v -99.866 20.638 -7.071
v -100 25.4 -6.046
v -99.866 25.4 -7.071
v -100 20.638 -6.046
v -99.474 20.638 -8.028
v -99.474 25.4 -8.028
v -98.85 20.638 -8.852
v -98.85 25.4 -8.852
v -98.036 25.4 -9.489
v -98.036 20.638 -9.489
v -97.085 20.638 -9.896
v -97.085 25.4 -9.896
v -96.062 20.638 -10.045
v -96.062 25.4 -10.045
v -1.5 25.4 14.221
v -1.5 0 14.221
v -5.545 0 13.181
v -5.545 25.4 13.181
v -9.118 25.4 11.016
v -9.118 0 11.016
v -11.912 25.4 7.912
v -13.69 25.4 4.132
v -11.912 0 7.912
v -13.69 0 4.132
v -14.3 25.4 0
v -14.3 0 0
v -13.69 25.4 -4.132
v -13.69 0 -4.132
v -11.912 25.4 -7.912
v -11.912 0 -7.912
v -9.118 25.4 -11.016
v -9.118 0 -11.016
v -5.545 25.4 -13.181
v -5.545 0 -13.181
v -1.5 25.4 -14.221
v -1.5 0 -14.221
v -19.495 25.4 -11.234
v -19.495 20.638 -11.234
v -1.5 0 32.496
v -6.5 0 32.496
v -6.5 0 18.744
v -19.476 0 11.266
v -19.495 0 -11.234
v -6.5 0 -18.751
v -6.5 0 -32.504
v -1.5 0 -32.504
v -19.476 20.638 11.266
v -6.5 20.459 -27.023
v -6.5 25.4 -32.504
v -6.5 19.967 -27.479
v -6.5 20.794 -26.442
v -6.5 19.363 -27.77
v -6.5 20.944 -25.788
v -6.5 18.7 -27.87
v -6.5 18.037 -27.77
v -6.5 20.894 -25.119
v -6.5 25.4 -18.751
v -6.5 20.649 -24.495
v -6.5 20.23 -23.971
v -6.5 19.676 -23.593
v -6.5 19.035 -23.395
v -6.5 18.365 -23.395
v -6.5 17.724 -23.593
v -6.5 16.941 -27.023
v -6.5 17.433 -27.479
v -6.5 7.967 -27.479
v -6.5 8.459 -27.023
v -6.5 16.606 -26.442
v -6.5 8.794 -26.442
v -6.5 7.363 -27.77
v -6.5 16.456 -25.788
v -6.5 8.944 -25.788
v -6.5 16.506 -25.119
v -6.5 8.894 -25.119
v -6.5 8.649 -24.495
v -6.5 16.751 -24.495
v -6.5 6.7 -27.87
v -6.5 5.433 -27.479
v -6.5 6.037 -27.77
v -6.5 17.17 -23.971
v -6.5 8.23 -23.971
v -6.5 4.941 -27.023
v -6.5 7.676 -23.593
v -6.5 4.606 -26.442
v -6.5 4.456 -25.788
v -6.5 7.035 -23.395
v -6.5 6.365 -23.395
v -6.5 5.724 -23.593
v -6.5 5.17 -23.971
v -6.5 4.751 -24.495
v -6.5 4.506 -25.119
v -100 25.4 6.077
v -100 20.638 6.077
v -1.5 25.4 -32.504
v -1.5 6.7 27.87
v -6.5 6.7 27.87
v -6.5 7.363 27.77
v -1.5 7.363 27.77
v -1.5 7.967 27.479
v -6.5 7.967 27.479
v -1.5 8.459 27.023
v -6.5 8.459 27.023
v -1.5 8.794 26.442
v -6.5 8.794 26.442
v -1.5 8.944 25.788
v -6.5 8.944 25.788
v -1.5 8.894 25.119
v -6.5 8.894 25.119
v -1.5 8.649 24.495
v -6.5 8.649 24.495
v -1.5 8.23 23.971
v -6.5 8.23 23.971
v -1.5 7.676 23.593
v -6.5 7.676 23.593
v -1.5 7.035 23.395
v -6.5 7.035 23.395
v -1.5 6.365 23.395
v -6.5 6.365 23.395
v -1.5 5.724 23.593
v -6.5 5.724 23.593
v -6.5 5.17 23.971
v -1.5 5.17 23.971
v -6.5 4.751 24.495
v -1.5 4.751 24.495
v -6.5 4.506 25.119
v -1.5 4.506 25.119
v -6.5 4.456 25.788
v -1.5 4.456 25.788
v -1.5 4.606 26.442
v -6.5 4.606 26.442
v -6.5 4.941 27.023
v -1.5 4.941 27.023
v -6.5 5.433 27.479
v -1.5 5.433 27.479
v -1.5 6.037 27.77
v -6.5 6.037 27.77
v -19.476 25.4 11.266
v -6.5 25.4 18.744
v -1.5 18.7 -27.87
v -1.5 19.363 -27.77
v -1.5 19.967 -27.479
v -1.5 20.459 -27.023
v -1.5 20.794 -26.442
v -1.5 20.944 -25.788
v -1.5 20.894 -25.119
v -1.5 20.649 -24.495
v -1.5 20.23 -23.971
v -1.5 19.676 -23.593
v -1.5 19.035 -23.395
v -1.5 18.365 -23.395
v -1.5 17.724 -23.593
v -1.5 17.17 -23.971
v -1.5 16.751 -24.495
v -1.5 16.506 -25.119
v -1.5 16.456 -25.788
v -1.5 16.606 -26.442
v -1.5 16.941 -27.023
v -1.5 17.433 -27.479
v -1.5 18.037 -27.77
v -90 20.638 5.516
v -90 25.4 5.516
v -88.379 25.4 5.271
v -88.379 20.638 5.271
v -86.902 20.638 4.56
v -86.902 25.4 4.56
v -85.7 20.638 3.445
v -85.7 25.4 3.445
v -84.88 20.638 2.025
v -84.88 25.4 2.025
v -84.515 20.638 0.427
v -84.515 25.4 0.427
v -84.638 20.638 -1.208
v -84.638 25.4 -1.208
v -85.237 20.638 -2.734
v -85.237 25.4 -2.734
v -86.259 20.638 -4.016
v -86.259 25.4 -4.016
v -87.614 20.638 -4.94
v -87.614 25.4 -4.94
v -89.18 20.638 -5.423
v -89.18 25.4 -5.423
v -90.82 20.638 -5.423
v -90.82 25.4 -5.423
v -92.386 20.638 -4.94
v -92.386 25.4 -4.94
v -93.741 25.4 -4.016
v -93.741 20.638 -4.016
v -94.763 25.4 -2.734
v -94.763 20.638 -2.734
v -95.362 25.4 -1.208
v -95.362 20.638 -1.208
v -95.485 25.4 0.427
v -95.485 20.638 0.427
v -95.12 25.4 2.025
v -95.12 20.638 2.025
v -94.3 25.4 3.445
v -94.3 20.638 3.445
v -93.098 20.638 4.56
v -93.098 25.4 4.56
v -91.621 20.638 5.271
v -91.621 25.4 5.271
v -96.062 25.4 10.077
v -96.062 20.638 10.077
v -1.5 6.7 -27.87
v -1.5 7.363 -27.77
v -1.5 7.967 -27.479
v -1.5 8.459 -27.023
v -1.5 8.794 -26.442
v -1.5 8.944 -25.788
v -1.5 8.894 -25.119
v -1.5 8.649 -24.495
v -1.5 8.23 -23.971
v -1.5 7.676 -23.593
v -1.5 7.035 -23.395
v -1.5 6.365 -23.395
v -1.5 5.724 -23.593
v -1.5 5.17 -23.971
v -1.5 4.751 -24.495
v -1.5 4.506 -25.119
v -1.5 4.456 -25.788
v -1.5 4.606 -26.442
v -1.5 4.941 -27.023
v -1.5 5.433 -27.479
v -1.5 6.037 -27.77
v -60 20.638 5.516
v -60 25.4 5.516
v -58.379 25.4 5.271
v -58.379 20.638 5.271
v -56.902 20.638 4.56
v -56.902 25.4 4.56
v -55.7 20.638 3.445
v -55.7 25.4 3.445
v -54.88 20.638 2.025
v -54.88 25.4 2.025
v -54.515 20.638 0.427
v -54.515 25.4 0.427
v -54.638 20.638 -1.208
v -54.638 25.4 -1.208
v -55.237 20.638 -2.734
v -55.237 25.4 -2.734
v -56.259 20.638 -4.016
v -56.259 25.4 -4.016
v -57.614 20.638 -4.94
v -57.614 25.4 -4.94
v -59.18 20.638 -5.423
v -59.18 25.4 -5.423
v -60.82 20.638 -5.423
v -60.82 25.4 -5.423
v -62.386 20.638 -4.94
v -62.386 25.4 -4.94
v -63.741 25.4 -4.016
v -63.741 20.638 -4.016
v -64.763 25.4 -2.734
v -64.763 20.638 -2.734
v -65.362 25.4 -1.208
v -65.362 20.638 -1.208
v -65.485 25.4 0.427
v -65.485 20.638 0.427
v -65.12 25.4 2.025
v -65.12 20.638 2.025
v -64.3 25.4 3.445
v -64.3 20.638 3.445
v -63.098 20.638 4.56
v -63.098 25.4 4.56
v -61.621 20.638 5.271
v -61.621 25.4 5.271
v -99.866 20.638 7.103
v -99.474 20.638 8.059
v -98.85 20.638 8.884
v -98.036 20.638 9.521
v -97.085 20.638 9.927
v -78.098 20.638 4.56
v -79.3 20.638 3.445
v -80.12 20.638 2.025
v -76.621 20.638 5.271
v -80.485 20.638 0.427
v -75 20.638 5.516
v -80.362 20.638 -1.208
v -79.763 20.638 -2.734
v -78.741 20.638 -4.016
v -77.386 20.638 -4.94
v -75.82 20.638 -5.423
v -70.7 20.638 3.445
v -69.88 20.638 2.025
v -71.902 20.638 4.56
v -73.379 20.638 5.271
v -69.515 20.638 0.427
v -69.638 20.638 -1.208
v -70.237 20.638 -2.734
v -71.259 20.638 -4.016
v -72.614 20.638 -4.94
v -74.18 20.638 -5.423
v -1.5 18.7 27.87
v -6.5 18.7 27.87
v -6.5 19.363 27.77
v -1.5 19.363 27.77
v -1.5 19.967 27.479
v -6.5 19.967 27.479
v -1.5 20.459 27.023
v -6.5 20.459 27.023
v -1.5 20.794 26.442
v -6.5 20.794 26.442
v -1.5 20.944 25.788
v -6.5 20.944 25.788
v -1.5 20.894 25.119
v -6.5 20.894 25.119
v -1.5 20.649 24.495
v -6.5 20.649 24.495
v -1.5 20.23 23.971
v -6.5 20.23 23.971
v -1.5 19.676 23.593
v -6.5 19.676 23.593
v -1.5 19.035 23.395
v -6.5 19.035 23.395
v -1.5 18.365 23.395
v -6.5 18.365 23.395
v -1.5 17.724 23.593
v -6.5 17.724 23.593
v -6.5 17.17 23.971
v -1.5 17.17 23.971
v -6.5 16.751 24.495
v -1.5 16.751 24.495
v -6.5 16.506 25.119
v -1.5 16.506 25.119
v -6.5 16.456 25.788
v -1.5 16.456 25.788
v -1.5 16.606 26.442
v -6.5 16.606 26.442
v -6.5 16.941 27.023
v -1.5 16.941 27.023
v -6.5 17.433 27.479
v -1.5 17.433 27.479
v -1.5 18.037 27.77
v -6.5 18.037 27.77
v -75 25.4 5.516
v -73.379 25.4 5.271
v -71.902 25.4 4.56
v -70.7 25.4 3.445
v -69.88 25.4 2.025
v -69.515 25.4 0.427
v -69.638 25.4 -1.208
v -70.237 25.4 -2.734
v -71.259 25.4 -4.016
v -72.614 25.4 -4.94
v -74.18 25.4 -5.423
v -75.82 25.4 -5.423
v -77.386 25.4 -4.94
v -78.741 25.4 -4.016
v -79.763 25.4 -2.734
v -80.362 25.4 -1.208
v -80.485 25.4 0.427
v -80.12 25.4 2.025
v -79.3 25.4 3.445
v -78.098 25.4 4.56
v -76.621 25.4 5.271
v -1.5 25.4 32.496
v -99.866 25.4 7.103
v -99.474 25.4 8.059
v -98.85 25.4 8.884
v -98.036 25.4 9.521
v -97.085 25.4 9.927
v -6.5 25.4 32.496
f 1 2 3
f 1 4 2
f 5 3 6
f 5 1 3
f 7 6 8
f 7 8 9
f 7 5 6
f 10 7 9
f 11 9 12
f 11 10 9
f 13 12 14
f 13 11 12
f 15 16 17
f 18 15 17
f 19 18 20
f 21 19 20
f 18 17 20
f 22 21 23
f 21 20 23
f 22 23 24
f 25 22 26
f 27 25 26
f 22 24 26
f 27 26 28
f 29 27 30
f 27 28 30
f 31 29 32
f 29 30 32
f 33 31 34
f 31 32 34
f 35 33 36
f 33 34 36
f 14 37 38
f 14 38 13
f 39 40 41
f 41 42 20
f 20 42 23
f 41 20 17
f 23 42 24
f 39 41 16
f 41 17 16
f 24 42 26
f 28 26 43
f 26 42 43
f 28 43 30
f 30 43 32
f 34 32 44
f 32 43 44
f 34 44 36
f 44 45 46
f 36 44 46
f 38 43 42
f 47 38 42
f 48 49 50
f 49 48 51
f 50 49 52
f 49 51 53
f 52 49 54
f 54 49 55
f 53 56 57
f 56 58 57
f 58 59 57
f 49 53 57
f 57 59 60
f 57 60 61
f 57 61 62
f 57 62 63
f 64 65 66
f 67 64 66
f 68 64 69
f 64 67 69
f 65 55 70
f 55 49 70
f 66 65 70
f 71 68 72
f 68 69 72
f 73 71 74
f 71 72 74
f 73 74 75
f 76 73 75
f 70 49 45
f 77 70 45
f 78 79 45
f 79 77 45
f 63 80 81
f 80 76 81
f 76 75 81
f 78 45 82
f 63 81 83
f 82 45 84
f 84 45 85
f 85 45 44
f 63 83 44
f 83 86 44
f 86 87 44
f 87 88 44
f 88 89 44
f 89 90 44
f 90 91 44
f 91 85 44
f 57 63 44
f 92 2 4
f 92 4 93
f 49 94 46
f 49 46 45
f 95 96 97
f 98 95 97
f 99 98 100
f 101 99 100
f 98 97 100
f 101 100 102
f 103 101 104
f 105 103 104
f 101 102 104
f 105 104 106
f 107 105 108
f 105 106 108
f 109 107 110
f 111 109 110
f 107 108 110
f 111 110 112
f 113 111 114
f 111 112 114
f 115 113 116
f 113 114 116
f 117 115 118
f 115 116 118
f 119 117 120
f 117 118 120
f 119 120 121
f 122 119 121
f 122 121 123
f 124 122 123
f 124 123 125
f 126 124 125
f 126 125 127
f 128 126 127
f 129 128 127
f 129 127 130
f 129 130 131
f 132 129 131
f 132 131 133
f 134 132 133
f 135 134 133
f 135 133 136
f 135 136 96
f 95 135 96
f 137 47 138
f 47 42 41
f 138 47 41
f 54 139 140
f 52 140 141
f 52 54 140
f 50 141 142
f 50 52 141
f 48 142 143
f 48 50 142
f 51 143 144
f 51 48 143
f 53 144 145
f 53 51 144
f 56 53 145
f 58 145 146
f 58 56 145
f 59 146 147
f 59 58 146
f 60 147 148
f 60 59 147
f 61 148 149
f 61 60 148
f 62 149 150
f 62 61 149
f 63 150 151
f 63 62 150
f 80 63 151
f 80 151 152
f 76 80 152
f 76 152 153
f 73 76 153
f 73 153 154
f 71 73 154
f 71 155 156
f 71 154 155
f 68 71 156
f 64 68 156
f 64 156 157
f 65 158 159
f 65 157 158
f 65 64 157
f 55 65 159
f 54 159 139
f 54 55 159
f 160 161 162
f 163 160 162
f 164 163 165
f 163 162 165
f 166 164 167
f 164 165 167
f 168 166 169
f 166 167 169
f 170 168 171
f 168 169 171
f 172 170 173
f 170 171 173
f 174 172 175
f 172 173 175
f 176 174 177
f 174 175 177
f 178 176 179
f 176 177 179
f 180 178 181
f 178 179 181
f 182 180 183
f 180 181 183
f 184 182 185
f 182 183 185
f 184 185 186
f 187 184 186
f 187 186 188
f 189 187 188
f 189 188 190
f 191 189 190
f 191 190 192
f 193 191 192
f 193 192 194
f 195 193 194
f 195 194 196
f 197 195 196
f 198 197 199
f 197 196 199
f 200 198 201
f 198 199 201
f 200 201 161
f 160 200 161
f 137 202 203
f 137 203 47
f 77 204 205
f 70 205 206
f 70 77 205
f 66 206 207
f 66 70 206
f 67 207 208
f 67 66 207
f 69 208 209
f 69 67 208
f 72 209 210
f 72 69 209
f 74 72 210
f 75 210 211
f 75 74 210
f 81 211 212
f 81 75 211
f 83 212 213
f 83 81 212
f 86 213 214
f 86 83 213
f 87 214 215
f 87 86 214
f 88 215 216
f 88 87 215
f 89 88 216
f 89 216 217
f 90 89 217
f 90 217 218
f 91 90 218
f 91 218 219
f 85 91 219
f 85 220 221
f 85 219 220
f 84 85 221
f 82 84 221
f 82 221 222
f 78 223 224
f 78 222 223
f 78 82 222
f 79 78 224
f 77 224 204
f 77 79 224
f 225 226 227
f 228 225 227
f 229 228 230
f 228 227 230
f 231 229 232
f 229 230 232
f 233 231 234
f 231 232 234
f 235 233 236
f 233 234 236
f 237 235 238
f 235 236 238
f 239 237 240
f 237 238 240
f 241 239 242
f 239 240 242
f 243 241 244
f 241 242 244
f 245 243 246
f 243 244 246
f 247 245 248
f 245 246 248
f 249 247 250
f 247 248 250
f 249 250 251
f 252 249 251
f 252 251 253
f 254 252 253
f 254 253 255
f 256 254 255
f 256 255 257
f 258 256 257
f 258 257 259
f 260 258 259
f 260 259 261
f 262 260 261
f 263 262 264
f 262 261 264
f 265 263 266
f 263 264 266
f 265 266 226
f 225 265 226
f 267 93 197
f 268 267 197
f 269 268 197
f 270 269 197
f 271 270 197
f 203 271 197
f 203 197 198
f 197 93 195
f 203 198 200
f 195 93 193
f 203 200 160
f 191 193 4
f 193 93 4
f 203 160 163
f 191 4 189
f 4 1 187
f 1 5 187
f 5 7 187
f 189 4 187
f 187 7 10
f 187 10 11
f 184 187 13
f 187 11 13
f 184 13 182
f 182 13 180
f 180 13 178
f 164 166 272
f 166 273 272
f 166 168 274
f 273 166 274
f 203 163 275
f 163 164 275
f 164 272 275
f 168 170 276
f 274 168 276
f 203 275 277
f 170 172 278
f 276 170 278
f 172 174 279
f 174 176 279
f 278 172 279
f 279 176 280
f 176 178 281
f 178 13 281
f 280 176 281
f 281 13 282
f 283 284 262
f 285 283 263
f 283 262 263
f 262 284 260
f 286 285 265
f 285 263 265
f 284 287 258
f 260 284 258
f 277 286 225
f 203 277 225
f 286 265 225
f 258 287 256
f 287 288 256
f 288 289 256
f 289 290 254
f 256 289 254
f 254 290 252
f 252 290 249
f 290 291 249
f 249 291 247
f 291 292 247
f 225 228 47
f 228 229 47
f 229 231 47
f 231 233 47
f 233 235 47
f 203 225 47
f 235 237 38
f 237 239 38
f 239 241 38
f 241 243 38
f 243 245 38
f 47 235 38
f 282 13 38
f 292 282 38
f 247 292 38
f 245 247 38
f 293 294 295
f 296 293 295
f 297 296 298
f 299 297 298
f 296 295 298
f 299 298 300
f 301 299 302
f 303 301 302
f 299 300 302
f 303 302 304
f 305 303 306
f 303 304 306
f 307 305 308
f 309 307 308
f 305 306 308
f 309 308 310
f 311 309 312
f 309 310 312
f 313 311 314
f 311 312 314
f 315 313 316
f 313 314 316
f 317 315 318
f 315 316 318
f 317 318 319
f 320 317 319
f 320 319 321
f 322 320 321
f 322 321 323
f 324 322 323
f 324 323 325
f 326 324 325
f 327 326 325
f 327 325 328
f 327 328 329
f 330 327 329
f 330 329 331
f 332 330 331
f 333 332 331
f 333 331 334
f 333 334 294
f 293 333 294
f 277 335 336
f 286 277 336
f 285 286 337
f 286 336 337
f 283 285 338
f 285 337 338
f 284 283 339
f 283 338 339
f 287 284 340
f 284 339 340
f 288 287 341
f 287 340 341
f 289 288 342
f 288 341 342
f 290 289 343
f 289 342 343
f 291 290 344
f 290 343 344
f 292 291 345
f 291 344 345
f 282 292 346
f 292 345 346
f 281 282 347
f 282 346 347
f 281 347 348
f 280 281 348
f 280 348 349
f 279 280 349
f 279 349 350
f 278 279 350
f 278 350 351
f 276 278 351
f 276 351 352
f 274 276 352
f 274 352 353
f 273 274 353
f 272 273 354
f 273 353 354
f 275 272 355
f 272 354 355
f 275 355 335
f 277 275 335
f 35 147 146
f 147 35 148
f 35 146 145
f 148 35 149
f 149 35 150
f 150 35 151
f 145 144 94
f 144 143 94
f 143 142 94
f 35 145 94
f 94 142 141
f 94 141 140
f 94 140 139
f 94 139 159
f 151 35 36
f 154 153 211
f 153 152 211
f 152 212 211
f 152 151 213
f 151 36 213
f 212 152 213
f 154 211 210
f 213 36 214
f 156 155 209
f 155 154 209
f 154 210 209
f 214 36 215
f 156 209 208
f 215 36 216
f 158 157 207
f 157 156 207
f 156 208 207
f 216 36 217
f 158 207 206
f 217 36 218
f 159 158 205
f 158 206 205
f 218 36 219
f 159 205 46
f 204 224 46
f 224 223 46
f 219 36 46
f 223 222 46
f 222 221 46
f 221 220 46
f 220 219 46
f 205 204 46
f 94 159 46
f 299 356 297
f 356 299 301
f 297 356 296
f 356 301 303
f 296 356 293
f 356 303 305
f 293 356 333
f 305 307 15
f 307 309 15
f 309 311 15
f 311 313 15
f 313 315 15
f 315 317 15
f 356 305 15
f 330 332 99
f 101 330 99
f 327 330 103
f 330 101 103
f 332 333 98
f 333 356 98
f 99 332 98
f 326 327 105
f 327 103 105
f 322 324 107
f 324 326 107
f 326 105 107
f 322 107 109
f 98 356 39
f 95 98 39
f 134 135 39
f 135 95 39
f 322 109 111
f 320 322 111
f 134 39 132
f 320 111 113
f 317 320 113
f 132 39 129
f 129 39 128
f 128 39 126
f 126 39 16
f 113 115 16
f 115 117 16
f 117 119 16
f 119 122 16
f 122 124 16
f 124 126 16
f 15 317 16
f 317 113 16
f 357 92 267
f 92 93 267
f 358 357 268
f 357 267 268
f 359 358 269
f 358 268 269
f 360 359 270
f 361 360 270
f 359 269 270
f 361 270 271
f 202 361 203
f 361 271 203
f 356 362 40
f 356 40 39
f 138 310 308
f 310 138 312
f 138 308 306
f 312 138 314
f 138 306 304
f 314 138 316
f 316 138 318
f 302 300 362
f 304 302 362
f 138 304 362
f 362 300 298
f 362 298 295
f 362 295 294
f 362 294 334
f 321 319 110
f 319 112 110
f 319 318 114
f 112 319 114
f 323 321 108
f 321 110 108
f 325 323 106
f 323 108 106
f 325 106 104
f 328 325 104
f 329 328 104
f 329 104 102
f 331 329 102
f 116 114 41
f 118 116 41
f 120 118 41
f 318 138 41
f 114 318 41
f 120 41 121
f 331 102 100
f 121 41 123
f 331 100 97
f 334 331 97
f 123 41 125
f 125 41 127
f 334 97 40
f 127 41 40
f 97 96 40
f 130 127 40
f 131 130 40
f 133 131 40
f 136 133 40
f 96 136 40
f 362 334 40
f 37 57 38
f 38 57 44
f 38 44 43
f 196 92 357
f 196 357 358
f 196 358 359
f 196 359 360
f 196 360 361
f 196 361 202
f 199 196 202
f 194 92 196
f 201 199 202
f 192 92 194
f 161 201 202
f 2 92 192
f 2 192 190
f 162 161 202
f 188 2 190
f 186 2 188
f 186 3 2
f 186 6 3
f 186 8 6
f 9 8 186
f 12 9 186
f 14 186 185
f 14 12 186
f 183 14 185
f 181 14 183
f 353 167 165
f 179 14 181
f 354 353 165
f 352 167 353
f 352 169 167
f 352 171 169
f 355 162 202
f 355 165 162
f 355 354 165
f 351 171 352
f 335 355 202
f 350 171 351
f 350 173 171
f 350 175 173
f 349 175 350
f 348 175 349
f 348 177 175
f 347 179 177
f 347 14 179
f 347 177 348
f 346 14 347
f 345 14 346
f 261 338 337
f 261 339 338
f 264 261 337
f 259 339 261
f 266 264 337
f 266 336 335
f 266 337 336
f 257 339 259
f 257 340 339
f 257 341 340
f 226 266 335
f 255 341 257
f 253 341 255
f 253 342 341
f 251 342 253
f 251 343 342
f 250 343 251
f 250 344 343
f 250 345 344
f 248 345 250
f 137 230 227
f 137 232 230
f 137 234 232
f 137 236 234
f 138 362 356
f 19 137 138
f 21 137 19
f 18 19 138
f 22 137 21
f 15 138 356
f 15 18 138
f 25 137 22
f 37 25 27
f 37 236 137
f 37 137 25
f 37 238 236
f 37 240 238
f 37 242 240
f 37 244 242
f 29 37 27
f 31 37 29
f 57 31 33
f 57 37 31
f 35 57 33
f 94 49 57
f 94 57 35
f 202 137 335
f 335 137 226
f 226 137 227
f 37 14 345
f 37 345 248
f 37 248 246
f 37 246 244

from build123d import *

# Parameters (mm, degrees)
BOSS_EXTRUDE1_DEPTH = 25.4
SKETCH2_R           = 2.25
CUT_EXTRUDE1_DEPTH  = 44.249277532
SKETCH3_R           = 5.5
BOSS_EXTRUDE2_DEPTH = 4.7625
FILLET1_R           = 4


with BuildPart() as part:
    # Sketch1 → Boss-Extrude1 (new body)
    with BuildSketch(Plane(origin=(0, 0, 0), x_dir=(1, 0, 0), z_dir=(0, 1, 0))):
        Polygon((-6.5, 18.750739811), (-1.5, 21.642901866), (-1.5, 32.503507515), (-6.5, 32.503507515), align=None)
        with BuildLine():
            Line((-1.5, -21.625070485), (-1.5, -14.221111068))
            ThreePointArc((-1.5, -14.221111068), (-14.3, 0), (-1.5, 14.221111068))
            Line((-1.5, 14.221111068), (-1.5, 21.642901866))
            Line((-1.5, 21.642901866), (-6.5, 18.750739811))
            Line((-6.5, 18.750739811), (-19.494691465, 11.234189098))
            Line((-19.494691465, 11.234189098), (-19.476438882, -11.265803499))
            Line((-19.476438882, -11.265803499), (-6.5, -18.743724782))
            Line((-6.5, -18.743724782), (-1.5, -21.625070485))
        make_face()
        Polygon((-1.5, -32.496492485), (-1.5, -21.625070485), (-6.5, -18.743724782), (-6.5, -32.496492485), align=None)
    extrude(amount=BOSS_EXTRUDE1_DEPTH)

    # Sketch2 → Cut-Extrude1 (cut, through all)
    with BuildSketch(Plane.ZY.offset(6.5)):
        with Locations((25.620108634, 18.7)):
            Circle(SKETCH2_R)
        with Locations((25.620108634, 6.7)):
            Circle(SKETCH2_R)
    cut_extrude1 = extrude(amount=-CUT_EXTRUDE1_DEPTH, mode=Mode.SUBTRACT)

    # Mirror1: Cut-Extrude1 across plane
    add(cut_extrude1.mirror(Plane.XY), mode=Mode.SUBTRACT)

    # Sketch3 → Boss-Extrude2 (add)
    with BuildSketch(Plane(origin=(0, 25.4, 0), x_dir=(1, 0, 0), z_dir=(0, 1, 0))):
        Polygon((-100, 9.984192799), (-100, -10.015807201), (-19.476438882, -11.265803499), (-19.494691465, 11.234189098), align=None)
        with Locations(Location((-60, -0.015807201, 0), (0, 0, 270))):
            Circle(SKETCH3_R, mode=Mode.SUBTRACT)
        with Locations(Location((-75, -0.015807201, 0), (0, 0, 270))):
            Circle(SKETCH3_R, mode=Mode.SUBTRACT)
        with Locations(Location((-90, -0.015807201, 0), (0, 0, 270))):
            Circle(SKETCH3_R, mode=Mode.SUBTRACT)
    extrude(amount=-BOSS_EXTRUDE2_DEPTH)

    # Fillet1
    fillet1_edges = [part.edges().sort_by_distance(p)[0] for p in [
        (-100, 23.01875, 10.015807201),
        (-100, 23.01875, -9.984192799),
    ]]
    fillet(fillet1_edges, radius=FILLET1_R)


solid = part.part
